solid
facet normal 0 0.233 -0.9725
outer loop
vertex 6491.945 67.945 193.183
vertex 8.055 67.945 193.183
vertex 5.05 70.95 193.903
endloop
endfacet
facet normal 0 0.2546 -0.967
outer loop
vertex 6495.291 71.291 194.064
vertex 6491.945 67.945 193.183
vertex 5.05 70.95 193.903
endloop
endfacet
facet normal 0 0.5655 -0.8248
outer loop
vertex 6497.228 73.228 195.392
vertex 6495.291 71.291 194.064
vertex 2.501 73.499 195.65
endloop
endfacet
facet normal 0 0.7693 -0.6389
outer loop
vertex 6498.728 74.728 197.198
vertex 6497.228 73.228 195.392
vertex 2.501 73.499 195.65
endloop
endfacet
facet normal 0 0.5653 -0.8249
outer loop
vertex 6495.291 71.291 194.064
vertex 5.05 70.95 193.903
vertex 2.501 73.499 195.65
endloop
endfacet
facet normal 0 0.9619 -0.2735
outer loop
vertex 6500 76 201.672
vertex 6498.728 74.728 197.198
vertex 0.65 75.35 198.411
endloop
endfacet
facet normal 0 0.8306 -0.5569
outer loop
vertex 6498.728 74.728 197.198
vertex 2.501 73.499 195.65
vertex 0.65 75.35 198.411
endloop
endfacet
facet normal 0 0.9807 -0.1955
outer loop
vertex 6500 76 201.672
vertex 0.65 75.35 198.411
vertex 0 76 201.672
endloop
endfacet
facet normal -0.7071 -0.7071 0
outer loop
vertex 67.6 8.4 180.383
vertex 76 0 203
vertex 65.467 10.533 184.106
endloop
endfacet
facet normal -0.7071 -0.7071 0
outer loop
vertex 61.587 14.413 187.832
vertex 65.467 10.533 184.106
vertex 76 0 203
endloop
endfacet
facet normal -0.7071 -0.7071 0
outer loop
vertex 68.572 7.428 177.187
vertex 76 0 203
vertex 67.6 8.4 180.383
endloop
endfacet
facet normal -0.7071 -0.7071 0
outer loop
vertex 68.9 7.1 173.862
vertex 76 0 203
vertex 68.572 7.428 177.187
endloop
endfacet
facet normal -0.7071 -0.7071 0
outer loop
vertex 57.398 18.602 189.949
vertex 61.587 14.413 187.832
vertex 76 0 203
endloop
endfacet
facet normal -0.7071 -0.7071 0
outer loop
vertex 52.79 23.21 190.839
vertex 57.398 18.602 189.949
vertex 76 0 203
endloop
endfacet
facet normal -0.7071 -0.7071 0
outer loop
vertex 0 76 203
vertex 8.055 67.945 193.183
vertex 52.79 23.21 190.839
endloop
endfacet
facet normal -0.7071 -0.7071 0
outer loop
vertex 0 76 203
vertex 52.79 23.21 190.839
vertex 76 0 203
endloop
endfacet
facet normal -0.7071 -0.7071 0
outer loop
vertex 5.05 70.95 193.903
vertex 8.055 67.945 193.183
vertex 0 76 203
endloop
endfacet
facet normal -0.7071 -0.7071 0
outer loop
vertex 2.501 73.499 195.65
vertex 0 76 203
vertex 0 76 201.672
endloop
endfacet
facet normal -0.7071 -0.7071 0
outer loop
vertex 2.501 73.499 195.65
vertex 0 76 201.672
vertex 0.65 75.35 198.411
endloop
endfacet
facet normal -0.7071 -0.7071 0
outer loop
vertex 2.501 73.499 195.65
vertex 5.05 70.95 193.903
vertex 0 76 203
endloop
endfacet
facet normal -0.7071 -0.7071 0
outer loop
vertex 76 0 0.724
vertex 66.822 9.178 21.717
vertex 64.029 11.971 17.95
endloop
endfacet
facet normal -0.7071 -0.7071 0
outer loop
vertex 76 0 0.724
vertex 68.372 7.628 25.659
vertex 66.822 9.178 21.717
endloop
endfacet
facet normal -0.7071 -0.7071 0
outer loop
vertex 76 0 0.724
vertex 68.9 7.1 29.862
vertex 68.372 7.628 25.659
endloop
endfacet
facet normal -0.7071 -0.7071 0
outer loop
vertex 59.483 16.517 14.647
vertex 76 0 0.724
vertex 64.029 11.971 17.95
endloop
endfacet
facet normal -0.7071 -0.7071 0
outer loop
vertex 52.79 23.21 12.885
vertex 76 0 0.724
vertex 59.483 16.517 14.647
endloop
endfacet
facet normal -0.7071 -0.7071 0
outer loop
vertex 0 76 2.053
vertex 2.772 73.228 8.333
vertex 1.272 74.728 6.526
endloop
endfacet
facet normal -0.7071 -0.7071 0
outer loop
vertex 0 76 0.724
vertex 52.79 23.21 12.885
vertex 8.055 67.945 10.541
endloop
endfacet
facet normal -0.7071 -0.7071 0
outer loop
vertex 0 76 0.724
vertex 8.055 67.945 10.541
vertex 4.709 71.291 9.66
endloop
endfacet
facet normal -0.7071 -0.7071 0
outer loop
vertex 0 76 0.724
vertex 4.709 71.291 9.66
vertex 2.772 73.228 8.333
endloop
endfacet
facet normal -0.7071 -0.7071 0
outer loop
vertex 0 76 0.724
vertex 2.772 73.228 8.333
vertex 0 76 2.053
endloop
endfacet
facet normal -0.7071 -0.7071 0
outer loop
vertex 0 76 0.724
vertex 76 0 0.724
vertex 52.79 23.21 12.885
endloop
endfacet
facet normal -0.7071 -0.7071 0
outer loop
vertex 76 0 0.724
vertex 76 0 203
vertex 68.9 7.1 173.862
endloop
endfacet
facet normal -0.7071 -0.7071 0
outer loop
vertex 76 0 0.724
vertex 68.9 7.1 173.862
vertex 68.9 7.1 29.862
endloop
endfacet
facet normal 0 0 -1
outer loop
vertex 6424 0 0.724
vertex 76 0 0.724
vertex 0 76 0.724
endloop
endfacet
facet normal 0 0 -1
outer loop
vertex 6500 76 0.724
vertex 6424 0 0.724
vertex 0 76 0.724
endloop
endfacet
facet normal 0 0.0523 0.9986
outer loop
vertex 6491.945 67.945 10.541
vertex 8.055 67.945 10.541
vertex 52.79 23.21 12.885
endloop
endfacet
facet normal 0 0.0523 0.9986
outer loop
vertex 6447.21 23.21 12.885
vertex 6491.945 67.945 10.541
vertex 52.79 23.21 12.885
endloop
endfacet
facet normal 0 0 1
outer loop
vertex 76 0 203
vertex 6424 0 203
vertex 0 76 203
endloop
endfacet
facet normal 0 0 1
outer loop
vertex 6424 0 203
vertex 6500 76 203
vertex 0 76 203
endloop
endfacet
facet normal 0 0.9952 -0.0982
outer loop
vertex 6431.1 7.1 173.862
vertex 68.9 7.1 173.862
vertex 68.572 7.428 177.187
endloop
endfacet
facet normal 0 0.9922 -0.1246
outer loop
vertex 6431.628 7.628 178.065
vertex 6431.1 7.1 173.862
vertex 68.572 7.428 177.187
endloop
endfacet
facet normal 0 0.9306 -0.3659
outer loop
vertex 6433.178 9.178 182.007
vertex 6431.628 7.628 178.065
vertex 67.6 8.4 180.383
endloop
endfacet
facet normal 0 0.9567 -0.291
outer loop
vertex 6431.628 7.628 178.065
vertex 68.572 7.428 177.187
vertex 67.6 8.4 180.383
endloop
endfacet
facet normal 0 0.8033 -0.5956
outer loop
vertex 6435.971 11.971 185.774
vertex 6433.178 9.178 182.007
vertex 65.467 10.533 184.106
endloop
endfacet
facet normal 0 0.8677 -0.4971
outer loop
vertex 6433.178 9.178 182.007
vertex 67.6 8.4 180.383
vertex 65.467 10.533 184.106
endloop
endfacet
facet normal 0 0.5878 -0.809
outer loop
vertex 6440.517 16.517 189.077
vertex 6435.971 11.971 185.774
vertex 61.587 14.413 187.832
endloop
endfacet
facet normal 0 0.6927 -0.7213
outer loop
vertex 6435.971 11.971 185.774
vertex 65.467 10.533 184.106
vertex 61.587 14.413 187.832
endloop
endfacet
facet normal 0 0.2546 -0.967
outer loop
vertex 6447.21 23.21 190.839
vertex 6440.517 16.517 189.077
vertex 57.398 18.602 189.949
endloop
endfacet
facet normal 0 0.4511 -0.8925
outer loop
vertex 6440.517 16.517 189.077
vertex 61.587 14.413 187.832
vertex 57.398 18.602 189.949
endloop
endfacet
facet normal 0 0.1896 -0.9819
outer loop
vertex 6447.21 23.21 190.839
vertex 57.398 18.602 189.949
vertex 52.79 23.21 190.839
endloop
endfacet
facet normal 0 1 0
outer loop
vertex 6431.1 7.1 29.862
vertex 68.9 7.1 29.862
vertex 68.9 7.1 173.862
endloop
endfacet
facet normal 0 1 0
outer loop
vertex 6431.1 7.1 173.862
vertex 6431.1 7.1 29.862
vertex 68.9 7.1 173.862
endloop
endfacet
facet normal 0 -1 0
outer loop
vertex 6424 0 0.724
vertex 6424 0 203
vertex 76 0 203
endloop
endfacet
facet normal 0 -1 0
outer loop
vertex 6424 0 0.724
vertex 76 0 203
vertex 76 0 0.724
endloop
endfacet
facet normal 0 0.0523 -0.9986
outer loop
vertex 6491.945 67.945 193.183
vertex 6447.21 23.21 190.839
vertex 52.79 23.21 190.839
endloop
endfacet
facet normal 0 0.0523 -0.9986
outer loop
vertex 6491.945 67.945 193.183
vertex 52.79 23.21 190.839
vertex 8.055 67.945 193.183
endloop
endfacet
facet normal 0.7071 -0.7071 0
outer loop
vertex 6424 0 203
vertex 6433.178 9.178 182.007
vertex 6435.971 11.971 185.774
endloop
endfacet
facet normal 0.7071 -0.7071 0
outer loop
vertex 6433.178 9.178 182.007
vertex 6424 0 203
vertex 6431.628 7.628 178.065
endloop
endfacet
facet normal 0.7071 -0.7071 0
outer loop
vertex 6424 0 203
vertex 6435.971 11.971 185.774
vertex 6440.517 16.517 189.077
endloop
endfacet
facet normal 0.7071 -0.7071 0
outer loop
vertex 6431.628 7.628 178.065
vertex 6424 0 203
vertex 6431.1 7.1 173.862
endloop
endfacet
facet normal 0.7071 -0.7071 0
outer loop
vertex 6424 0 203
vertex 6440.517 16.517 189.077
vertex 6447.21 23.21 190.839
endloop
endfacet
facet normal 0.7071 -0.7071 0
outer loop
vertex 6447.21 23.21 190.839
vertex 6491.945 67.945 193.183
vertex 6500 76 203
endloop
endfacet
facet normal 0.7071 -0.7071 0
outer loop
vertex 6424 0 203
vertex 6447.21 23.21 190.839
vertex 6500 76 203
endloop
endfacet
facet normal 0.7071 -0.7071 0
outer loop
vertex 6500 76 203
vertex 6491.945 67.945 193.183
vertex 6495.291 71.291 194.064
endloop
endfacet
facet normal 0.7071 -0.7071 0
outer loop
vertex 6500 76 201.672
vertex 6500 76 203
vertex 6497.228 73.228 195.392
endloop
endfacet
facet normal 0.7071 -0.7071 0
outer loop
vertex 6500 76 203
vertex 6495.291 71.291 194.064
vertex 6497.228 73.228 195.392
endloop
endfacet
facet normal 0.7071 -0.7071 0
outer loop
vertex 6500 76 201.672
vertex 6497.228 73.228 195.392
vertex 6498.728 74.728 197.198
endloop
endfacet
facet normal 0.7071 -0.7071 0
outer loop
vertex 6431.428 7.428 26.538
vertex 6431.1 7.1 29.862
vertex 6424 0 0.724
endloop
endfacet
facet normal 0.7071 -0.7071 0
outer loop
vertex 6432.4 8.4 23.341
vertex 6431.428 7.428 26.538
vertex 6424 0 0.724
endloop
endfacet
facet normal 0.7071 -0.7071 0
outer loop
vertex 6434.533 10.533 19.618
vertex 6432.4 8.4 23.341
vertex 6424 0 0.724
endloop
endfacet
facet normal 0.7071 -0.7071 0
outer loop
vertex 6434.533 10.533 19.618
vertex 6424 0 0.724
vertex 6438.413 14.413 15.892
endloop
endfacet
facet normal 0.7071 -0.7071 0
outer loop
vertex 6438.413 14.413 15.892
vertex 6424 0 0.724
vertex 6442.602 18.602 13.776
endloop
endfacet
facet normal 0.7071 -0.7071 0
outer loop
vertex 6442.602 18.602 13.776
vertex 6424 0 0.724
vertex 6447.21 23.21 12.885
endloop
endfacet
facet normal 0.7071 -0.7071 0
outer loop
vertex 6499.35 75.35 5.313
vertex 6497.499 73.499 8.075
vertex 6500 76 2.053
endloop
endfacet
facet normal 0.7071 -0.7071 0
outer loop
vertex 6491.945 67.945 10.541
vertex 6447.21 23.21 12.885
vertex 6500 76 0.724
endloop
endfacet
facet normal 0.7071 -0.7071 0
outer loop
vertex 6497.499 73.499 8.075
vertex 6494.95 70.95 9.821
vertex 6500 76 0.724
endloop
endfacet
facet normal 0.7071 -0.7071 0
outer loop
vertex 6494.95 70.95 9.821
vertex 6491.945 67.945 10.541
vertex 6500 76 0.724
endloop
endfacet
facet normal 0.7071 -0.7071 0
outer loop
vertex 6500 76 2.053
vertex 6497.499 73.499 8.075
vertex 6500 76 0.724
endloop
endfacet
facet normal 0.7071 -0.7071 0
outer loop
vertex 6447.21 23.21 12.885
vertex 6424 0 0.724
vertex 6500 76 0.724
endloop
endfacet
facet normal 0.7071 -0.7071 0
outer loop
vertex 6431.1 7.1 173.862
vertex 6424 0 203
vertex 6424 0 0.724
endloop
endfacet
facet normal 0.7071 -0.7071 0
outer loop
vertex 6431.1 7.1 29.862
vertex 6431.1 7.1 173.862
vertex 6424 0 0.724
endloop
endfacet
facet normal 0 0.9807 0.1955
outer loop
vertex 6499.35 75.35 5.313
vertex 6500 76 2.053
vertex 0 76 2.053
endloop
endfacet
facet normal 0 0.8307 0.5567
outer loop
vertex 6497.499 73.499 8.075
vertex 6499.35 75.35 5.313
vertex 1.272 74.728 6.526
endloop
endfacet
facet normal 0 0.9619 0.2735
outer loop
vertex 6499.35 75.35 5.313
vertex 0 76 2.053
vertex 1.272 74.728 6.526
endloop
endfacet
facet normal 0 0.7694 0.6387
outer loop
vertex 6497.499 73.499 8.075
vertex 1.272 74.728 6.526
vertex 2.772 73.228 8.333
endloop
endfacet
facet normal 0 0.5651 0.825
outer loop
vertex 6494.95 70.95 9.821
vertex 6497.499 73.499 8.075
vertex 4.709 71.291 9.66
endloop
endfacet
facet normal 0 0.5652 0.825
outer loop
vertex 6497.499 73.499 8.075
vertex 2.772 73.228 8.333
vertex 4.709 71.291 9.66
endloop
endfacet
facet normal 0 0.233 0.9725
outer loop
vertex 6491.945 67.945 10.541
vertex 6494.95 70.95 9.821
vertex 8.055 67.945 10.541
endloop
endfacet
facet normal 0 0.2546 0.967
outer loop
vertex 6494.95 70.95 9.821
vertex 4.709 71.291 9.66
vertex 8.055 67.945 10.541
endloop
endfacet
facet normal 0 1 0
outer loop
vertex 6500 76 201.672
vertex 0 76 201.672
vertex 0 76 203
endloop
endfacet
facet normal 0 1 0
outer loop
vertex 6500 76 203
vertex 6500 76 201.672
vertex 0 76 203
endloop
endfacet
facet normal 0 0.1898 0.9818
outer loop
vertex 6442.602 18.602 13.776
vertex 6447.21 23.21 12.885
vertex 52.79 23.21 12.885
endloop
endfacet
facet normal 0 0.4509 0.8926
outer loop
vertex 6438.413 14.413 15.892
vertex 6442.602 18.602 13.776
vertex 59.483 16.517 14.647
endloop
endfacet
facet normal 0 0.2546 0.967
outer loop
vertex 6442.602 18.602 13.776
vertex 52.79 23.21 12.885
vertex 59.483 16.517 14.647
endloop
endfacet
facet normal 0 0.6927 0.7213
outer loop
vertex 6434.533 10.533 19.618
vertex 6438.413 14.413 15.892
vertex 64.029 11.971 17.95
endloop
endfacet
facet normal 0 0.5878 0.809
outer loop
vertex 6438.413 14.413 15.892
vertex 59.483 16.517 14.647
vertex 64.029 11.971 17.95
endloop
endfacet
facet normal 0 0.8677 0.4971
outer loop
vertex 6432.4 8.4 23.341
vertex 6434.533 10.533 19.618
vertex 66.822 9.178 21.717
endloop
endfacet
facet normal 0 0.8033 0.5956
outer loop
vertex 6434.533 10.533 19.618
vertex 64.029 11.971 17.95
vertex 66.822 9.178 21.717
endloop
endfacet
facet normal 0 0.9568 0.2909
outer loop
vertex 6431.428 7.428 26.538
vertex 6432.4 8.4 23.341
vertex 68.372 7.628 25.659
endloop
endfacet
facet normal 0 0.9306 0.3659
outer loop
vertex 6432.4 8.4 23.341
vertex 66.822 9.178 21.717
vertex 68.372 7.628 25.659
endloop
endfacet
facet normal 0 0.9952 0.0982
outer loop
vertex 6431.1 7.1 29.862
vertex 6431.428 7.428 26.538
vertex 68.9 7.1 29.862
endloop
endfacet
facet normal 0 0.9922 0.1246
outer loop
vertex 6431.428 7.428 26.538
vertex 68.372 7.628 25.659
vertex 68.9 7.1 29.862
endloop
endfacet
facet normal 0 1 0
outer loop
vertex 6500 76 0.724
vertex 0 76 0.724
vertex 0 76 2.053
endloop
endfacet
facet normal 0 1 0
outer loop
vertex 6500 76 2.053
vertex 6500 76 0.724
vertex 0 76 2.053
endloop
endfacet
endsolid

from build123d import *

# Parameters (mm, degrees)
F1_DEPTH = 6500
F3_DEPTH = 203.001


# Not quite as in the source:
# - a pattern or mirror of a feature is missing from the dataset's text; its kind, count and spacing are read off the source's solid


with BuildPart() as f1:
    # F0 (on Right) → F1 (new body)
    with BuildSketch(Plane.YZ):
        with BuildLine():
            Line((0, 203), (0, 0.7243087391))
            Line((0, 0.7243087391), (76, 0.7243087391))
            Line((76, 0.7243087391), (76, 2.0526619257))
            ThreePointArc((76, 2.0526619257), (73.6656821536, 7.9036758191), (67.9448556281, 10.5410129711))
            Line((67.9448556281, 10.5410129711), (23.2102887439, 12.8854522787))
            ThreePointArc((23.2102887439, 12.8854522787), (11.7686356928, 18.1601265828), (7.1, 29.8621543695))
            Line((7.1, 29.8621543695), (7.1, 173.8621543695))
            ThreePointArc((7.1, 173.8621543695), (11.7686356928, 185.5641821563), (23.2102887439, 190.8388564604))
            Line((23.2102887439, 190.8388564604), (67.9448556281, 193.183295768))
            ThreePointArc((67.9448556281, 193.183295768), (73.6656821536, 195.82063292), (76, 201.6716468134))
            Line((76, 201.6716468134), (76, 203))
            Line((76, 203), (0, 203))
        make_face()
    extrude(amount=F1_DEPTH)

    # F2 (on Top) → F3 (cut, through all)
    with BuildSketch(Plane.XY):
        Polygon((0, 76), (0, 0), (76, 0), align=None)
    f3 = extrude(amount=F3_DEPTH, mode=Mode.SUBTRACT)

    # F3_copies: F3 across plane
    add(f3.mirror(Plane(origin=(3250, 0, 0), x_dir=(0, 0, 1), z_dir=(1, 0, 0))), mode=Mode.SUBTRACT)


solid = f1.part
